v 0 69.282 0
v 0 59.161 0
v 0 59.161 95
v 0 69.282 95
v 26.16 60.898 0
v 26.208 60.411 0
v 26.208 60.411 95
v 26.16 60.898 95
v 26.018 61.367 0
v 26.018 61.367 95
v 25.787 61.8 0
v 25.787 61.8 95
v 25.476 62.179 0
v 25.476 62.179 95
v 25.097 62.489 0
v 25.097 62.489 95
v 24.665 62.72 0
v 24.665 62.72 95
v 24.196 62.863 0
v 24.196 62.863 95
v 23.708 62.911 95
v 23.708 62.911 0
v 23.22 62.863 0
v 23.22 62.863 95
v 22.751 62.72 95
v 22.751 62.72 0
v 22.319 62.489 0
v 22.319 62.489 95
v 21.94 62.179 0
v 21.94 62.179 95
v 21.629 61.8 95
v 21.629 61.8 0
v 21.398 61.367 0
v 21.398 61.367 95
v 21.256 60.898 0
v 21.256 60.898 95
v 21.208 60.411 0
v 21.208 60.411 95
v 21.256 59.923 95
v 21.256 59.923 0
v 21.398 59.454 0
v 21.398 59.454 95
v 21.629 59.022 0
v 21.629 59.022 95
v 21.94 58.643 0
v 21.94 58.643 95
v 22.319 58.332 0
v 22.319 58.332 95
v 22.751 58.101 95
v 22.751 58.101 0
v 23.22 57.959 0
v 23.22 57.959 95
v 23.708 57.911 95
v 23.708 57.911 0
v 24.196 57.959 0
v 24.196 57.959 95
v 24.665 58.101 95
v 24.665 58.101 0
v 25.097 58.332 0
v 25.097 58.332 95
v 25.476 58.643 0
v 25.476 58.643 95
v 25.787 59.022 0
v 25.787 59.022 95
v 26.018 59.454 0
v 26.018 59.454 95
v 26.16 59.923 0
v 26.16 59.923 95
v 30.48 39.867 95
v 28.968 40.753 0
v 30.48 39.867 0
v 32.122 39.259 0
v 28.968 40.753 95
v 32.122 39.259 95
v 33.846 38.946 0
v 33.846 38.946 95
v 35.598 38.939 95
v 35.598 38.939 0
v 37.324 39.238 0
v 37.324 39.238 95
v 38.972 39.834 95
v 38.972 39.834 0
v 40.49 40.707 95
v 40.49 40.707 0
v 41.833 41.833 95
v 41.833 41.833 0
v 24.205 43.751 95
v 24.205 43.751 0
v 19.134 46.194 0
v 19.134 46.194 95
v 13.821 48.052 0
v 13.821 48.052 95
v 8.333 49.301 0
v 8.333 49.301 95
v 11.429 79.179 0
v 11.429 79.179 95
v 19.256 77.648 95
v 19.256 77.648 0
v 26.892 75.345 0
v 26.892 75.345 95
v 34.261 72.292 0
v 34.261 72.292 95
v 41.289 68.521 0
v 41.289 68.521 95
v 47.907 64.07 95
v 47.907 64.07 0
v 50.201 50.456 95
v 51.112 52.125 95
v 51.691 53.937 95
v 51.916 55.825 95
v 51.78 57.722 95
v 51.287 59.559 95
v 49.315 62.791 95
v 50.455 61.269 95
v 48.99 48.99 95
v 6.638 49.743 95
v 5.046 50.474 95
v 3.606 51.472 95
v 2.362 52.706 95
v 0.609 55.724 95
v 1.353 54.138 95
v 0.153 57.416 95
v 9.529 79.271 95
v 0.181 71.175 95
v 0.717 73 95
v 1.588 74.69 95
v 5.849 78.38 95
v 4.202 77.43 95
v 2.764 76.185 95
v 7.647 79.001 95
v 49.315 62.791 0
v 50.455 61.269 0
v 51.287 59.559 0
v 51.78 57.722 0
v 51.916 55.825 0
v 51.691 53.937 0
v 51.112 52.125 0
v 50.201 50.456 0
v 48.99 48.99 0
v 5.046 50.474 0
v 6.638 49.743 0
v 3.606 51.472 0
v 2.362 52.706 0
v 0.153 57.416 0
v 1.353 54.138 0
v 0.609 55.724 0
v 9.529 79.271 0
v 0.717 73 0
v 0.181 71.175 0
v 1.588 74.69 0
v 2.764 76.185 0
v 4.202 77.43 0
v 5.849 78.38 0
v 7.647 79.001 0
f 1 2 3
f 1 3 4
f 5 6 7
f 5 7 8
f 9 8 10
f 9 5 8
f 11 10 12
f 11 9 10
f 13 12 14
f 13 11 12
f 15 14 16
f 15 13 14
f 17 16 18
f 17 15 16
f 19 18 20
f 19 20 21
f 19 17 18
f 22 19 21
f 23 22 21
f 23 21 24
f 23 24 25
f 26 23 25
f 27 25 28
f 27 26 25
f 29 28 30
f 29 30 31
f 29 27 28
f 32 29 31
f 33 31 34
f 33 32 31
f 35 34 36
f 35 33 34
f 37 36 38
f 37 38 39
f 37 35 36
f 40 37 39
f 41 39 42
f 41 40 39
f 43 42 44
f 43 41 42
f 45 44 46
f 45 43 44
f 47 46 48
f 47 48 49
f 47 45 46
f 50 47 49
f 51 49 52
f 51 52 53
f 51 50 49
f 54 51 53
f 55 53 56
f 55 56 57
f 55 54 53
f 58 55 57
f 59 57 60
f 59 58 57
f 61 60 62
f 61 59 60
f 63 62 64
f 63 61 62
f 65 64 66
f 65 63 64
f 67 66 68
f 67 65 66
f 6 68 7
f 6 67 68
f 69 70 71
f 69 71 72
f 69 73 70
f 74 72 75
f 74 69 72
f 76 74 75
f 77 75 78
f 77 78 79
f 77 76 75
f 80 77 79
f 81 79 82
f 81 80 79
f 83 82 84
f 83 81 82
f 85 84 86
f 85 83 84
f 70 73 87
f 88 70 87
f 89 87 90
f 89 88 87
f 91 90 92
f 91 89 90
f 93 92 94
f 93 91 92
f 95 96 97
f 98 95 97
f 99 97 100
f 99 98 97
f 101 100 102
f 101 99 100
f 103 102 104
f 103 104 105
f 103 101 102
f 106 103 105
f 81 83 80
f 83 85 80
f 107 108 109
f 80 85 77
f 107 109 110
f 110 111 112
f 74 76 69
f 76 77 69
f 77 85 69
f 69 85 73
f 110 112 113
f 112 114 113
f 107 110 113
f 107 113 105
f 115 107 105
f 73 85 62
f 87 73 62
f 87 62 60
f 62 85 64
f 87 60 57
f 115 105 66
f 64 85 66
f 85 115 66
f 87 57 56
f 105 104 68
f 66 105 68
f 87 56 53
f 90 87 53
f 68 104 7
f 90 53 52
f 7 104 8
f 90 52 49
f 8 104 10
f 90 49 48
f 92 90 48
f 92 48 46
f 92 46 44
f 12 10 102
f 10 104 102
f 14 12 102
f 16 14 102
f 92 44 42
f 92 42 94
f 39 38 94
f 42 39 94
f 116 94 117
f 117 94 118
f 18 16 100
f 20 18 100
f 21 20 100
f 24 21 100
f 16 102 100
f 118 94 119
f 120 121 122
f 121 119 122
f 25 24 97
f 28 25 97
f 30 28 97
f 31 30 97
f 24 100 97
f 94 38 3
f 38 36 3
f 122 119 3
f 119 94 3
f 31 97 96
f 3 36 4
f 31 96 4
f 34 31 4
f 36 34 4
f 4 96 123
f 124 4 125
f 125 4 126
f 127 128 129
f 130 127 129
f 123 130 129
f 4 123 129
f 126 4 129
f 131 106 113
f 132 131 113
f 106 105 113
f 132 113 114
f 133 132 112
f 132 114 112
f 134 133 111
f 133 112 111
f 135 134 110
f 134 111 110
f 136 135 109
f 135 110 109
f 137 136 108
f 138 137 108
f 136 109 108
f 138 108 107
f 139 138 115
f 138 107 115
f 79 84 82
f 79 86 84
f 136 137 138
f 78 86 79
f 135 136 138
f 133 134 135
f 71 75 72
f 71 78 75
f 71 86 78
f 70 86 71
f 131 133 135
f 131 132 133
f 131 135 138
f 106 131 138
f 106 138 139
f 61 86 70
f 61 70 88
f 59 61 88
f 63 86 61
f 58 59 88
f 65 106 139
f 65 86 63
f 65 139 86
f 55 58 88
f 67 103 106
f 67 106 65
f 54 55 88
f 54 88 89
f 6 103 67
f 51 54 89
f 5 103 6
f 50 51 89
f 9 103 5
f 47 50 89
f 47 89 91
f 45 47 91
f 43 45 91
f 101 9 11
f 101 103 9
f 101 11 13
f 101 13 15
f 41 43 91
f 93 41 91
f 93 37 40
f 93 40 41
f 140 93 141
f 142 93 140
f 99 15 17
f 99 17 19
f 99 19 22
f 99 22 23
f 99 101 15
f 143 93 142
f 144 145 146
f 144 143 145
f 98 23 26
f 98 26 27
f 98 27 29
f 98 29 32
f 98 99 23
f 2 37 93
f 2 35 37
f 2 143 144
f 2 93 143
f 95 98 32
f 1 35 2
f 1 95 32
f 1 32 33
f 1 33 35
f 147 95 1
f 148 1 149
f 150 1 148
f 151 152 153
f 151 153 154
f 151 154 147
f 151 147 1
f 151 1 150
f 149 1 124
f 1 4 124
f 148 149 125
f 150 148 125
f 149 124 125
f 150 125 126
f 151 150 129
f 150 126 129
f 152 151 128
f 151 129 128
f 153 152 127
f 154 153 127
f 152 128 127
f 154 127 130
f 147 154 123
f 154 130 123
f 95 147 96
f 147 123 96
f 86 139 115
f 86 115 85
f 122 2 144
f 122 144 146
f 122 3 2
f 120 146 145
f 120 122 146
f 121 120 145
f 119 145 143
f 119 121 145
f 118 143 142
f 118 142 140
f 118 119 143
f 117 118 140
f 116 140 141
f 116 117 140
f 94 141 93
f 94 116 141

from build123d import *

# Parameters (mm, degrees)
SKETCH_1_R      = 2.5
EXTRUDE_1_DEPTH = 95
FILLET_1_R      = 10


with BuildPart() as part:
    # 草图1 → 凸台-拉伸1 (new body)
    with BuildSketch(Plane.XY):
        with BuildLine():
            Line((0, 50), (0, 80))
            ThreePointArc((0, 80), (30.614674589, 73.910362601), (56.568542495, 56.568542495))
            Line((56.568542495, 56.568542495), (35.355339059, 35.355339059))
            ThreePointArc((35.355339059, 35.355339059), (19.134171618, 46.193976626), (0, 50))
        make_face()
        with Locations((23.70806473, 60.410770511)):
            Circle(SKETCH_1_R, mode=Mode.SUBTRACT)
    extrude(amount=EXTRUDE_1_DEPTH)

    # 圆角1
    fillet_1_edges = [part.edges().sort_by_distance(p)[0] for p in [
        (56.568542495, 56.568542495, 47.5),
        (35.355339059, 35.355339059, 47.5),
        (0, 50, 47.5),
        (0, 80, 47.5),
    ]]
    fillet(fillet_1_edges, radius=FILLET_1_R)


solid = part.part
